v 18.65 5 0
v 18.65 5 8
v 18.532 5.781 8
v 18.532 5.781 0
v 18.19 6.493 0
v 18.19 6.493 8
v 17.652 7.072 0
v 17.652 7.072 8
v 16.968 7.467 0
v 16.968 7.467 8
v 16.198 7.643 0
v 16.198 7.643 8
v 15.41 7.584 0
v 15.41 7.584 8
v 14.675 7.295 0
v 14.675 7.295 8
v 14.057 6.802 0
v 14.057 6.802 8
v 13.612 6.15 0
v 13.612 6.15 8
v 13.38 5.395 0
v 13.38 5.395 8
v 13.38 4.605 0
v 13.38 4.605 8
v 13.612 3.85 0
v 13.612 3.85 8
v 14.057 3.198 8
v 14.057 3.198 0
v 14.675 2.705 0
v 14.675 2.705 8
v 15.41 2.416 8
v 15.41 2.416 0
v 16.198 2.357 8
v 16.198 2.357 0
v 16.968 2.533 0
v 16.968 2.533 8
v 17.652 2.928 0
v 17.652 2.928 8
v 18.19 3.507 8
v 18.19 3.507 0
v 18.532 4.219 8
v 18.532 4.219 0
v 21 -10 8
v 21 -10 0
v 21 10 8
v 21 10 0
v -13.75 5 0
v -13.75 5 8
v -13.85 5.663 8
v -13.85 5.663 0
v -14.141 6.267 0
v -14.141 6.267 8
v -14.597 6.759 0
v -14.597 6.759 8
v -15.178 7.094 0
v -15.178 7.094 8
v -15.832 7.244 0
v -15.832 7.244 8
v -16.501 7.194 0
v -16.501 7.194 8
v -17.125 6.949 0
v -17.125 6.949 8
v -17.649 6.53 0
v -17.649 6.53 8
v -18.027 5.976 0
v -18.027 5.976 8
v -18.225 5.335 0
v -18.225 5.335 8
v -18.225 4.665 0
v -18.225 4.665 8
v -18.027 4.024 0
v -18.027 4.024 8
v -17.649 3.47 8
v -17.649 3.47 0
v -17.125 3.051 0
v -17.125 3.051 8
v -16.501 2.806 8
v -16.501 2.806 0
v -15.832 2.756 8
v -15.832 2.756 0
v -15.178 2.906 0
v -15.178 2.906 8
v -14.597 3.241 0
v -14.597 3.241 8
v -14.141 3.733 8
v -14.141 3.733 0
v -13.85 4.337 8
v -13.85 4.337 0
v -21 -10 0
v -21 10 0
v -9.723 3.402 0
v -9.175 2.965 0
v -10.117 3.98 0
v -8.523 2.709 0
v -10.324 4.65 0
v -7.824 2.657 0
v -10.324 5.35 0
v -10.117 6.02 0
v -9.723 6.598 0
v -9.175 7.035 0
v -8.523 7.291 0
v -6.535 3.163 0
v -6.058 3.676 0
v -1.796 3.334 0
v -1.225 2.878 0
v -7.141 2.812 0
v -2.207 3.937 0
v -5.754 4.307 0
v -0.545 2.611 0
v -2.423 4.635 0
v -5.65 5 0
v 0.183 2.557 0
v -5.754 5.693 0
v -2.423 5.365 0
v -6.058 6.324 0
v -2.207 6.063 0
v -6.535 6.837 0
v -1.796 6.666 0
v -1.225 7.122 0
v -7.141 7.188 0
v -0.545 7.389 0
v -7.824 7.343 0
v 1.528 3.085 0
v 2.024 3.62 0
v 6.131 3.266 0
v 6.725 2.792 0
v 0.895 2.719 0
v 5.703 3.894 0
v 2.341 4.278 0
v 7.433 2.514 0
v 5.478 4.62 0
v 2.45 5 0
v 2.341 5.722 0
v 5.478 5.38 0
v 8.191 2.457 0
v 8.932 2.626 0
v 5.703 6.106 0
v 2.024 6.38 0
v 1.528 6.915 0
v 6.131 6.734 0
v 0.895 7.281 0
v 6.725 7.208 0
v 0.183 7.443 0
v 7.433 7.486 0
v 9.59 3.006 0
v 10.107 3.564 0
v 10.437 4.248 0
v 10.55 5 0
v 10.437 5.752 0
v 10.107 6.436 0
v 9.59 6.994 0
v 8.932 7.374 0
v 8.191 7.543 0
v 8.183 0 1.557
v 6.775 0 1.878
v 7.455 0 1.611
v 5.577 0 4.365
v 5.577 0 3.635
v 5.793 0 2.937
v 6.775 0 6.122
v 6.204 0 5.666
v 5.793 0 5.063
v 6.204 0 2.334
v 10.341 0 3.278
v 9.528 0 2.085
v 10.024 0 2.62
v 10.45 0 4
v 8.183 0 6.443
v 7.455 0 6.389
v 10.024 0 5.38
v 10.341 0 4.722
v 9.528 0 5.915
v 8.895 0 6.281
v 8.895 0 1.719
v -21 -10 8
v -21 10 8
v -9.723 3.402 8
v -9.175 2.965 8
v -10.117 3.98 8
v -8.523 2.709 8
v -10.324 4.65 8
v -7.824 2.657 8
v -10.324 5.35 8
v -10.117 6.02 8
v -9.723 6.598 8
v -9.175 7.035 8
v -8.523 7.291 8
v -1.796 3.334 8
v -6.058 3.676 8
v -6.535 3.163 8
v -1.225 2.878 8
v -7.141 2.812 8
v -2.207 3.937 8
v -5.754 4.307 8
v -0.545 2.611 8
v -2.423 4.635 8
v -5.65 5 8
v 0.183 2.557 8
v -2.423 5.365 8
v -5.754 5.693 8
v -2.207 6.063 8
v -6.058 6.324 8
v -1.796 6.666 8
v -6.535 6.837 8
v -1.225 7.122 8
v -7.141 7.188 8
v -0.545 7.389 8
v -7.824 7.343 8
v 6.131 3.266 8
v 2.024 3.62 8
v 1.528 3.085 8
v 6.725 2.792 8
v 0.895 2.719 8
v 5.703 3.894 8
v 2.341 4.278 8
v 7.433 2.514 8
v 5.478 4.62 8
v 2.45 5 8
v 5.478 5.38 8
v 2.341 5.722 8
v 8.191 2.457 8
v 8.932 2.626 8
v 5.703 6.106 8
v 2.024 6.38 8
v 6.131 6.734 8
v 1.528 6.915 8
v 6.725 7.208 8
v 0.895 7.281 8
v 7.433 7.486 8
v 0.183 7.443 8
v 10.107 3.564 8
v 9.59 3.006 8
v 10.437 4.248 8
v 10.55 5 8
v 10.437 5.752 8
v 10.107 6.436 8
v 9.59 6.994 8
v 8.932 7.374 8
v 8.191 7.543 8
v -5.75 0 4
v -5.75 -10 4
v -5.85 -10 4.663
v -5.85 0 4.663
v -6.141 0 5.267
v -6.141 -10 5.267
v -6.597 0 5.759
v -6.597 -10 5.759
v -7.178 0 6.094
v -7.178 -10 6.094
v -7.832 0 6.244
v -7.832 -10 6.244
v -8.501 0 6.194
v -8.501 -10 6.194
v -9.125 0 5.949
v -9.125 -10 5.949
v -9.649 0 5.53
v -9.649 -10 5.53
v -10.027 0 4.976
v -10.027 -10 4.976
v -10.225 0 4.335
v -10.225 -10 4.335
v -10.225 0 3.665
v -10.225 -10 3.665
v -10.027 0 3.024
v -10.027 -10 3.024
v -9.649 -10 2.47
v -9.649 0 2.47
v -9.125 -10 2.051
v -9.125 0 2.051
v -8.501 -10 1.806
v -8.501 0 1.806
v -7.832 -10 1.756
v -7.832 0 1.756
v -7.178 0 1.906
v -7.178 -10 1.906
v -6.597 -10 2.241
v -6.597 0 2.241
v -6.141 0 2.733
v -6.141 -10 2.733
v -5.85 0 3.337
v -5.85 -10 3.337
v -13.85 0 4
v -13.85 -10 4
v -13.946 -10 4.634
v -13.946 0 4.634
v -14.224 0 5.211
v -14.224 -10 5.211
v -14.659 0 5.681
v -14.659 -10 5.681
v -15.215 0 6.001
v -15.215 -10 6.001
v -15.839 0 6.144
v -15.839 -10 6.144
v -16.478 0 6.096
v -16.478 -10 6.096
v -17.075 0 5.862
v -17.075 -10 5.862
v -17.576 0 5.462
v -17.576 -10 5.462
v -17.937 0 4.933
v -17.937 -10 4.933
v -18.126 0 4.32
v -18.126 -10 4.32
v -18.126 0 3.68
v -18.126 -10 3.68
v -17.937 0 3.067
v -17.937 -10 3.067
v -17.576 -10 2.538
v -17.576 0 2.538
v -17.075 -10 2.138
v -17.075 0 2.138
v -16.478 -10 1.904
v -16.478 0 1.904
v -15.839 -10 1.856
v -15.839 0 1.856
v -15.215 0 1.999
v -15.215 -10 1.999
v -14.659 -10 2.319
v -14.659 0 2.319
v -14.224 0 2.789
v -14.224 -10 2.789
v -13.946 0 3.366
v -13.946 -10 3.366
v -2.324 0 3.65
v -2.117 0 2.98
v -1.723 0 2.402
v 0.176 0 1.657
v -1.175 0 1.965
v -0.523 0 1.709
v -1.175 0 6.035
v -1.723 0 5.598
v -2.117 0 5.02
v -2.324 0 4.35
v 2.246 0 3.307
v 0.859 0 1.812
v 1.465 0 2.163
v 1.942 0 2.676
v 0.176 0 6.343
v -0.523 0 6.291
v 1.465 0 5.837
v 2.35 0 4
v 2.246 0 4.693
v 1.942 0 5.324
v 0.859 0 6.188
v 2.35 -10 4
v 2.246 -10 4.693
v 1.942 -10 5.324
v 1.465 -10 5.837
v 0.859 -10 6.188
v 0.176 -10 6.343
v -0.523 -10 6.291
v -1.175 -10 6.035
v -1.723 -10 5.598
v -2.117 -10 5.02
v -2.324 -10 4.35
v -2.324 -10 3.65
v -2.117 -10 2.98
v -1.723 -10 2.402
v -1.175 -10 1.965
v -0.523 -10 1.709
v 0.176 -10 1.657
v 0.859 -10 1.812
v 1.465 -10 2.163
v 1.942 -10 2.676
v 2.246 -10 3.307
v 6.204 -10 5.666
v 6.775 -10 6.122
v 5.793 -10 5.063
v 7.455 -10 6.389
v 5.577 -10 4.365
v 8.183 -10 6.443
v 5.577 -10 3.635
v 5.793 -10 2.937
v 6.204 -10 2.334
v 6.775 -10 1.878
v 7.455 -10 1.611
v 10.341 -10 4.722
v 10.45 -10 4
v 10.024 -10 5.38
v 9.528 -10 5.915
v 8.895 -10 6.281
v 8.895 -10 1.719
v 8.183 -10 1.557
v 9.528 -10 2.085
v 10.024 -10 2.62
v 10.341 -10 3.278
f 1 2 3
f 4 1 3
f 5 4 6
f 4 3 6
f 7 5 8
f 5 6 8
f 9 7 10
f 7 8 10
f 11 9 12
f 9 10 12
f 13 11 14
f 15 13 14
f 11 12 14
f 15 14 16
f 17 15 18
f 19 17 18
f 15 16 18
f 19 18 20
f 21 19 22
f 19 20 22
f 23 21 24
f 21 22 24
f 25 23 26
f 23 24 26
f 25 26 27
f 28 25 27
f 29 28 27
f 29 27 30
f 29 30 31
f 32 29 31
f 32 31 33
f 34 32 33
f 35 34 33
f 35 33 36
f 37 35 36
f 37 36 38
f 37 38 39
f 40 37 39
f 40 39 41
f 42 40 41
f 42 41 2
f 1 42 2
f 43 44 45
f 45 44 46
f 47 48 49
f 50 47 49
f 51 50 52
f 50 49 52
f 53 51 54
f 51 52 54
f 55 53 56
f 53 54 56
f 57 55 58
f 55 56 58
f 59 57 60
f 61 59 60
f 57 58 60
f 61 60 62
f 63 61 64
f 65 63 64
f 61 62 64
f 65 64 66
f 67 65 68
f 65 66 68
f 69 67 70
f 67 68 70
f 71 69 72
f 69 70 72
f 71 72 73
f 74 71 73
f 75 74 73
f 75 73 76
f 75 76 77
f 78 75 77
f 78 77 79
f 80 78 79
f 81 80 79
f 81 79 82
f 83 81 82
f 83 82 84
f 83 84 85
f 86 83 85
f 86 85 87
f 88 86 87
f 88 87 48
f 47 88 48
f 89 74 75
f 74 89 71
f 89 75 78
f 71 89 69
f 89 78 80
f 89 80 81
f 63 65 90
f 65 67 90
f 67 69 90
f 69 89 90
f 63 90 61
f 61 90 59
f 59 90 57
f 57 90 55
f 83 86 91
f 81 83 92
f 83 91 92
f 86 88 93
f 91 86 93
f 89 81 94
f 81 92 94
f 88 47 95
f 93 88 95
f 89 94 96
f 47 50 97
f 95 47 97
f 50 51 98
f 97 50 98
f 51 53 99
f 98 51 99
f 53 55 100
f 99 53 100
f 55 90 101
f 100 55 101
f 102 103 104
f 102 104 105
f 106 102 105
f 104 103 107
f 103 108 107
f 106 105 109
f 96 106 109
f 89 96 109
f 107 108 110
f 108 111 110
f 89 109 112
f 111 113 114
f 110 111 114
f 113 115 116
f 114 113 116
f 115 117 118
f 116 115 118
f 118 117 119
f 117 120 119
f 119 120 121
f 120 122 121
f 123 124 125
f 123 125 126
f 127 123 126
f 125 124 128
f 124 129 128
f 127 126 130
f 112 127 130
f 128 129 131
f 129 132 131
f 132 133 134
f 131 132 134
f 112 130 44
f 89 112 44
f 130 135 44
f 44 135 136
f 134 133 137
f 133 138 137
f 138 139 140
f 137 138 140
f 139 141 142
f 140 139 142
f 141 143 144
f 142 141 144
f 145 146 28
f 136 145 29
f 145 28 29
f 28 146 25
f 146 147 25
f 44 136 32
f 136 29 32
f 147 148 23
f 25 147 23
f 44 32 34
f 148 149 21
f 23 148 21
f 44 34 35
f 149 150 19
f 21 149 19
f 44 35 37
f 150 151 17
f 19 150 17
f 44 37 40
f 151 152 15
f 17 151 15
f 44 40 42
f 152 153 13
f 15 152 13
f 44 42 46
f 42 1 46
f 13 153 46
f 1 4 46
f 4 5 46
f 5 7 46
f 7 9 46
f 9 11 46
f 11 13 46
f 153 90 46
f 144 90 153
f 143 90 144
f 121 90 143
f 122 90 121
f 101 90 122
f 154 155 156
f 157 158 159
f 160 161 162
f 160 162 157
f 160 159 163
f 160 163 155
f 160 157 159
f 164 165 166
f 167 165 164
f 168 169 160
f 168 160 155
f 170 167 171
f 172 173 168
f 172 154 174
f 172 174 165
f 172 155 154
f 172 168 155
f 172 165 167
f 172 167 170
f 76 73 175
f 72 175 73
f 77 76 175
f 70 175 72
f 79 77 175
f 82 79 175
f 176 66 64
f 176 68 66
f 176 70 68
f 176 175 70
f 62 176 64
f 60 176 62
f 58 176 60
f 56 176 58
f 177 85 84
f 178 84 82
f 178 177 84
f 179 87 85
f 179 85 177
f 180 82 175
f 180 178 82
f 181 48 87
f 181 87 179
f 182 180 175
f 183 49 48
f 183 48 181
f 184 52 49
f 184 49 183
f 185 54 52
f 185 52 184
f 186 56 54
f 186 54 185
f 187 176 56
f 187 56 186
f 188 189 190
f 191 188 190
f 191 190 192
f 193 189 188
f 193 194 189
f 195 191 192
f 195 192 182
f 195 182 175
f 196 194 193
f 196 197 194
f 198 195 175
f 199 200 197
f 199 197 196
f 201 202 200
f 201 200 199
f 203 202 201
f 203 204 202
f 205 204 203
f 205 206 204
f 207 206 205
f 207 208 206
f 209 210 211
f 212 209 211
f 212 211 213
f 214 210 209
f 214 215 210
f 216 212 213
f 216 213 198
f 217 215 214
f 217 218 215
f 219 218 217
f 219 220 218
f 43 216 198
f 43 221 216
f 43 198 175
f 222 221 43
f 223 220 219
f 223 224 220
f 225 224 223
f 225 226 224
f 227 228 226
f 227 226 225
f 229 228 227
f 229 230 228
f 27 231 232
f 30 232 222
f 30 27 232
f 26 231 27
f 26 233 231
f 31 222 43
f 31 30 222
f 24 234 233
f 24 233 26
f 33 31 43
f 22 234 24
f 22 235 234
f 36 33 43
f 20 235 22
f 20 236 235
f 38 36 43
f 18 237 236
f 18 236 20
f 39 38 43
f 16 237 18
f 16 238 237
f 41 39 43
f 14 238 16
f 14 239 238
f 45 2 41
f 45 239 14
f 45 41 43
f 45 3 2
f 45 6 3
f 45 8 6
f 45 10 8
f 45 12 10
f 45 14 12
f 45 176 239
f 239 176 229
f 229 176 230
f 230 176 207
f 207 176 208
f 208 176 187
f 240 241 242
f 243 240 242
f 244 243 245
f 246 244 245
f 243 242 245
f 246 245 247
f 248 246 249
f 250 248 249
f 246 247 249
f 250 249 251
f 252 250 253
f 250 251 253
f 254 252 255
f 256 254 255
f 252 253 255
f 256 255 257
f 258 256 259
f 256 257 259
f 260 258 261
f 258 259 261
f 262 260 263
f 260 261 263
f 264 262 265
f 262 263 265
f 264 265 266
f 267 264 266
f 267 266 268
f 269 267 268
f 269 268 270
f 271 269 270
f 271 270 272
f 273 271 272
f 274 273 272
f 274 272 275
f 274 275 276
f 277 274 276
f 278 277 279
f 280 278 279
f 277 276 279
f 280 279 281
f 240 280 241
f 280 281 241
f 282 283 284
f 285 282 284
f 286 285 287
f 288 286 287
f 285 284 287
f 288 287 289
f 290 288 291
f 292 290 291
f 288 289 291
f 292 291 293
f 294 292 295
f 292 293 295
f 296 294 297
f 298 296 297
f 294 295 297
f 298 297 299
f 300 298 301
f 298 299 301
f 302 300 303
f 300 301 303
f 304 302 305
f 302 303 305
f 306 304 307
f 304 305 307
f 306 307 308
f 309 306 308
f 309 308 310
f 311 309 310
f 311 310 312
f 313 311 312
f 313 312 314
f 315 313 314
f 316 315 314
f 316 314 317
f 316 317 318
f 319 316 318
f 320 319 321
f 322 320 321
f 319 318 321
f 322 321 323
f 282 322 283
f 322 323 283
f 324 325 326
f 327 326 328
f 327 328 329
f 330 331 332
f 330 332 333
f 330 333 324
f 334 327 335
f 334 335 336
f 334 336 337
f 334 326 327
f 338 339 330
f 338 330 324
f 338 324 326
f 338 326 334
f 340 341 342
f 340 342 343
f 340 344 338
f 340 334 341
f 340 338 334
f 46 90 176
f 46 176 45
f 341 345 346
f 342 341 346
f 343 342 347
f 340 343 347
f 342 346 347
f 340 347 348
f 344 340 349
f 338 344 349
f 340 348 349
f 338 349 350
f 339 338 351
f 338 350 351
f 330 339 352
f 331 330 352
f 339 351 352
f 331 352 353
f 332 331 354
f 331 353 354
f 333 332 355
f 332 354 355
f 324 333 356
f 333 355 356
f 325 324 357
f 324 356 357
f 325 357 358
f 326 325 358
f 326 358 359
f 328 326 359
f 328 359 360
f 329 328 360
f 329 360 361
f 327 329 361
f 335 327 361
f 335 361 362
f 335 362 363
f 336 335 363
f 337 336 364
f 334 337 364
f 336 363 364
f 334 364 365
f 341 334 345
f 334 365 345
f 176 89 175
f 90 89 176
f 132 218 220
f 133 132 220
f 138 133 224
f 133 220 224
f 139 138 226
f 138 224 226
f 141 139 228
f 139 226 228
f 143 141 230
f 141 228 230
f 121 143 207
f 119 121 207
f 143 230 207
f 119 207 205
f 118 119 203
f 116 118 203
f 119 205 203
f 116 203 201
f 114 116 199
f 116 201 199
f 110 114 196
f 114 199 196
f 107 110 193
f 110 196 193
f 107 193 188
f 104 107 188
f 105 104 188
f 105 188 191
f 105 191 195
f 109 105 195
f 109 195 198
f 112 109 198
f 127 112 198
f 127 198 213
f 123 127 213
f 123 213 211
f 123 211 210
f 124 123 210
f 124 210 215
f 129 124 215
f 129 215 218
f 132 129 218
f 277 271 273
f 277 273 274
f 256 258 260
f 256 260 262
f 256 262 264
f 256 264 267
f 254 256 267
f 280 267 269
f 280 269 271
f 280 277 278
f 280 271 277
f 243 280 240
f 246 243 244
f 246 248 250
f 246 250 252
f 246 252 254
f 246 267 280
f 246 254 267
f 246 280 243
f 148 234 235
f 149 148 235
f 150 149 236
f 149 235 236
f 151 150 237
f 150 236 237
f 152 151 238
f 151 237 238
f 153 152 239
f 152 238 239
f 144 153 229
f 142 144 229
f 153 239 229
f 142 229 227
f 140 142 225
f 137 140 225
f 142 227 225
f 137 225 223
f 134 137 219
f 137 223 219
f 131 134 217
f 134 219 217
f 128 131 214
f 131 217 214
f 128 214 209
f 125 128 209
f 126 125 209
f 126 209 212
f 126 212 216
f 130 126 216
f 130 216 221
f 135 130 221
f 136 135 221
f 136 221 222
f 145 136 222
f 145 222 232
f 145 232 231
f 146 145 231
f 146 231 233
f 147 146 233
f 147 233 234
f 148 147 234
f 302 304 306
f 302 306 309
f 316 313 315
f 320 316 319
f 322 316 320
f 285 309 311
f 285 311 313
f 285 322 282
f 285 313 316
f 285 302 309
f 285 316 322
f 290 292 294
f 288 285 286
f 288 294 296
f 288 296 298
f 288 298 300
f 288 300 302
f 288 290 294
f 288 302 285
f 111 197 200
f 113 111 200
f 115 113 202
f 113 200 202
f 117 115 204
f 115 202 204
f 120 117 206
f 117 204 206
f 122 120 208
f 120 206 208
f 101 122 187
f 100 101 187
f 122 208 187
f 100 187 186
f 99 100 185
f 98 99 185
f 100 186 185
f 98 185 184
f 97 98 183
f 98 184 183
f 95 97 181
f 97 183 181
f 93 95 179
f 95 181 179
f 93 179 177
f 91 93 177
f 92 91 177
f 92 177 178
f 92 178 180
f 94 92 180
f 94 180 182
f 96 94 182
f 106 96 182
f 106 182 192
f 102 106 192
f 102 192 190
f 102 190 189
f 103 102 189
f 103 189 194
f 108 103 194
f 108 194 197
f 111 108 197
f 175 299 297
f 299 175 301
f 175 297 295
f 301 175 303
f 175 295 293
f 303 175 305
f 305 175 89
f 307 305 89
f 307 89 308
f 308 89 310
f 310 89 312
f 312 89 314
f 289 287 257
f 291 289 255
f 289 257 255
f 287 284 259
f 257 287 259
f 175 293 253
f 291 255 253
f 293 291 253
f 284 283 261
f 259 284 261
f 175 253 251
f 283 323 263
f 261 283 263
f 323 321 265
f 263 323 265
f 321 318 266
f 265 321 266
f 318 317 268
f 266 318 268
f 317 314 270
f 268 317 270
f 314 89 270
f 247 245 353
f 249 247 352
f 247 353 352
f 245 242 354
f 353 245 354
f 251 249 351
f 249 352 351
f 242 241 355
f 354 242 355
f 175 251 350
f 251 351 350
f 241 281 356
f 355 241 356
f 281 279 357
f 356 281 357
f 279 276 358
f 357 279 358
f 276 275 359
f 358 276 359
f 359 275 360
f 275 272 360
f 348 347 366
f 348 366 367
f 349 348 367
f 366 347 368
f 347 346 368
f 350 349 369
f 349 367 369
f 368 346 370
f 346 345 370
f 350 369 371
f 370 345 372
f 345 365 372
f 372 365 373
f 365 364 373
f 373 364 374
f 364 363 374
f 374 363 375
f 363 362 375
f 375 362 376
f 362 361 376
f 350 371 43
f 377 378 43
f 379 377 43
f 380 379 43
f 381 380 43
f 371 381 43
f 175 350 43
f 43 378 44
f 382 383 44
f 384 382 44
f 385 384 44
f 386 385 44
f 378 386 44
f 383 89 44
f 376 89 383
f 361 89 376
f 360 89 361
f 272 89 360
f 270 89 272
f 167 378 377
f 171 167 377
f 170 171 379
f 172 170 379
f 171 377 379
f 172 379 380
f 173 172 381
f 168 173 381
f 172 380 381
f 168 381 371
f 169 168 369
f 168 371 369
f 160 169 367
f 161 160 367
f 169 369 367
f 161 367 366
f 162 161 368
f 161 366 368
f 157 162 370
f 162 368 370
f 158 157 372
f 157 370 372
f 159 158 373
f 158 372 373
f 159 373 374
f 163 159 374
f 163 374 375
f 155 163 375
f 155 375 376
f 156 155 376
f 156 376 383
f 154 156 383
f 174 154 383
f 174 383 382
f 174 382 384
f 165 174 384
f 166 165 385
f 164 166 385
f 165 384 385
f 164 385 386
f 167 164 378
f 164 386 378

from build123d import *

# Parameters (mm, degrees)
SKETCH_1_W          = 42
SKETCH_1_H          = 20
EXTRUDE_1_DEPTH     = 8
SKETCH_2_R          = 2.25
SKETCH_2_R_2        = 2.35
SKETCH_2_R_3        = 2.45
SKETCH_2_R_4        = 2.55
SKETCH_2_R_5        = 2.65
CUT_EXTRUDE_1_DEPTH = 9
SKETCH_3_R          = 2.15
SKETCH_3_R_2        = 2.25
SKETCH_3_R_3        = 2.35
SKETCH_3_R_4        = 2.45
CUT_EXTRUDE_2_DEPTH = 10


with BuildPart() as part:
    # ｽｹｯﾁ1 → ﾎﾞｽ - 押し出し1 (new body)
    with BuildSketch(Plane.XY):
        Rectangle(SKETCH_1_W, SKETCH_1_H)
    extrude(amount=EXTRUDE_1_DEPTH)

    # ｽｹｯﾁ2 → ｶｯﾄ - 押し出し1 (cut, through all)
    with BuildSketch(Plane.XY.offset(8)):
        with Locations((-16, 5)):
            Circle(SKETCH_2_R)
        with Locations((-8, 5)):
            Circle(SKETCH_2_R_2)
        with Locations((0, 5)):
            Circle(SKETCH_2_R_3)
        with Locations((8, 5)):
            Circle(SKETCH_2_R_4)
        with Locations((16, 5)):
            Circle(SKETCH_2_R_5)
    extrude(amount=-CUT_EXTRUDE_1_DEPTH, mode=Mode.SUBTRACT)

    # ｽｹｯﾁ3 → ｶｯﾄ - 押し出し2 (cut)
    with BuildSketch(Plane.XZ.offset(10)):
        with Locations((-16, 4)):
            Circle(SKETCH_3_R)
        with Locations((-8, 4)):
            Circle(SKETCH_3_R_2)
        with Locations((0, 4)):
            Circle(SKETCH_3_R_3)
        with Locations((8, 4)):
            Circle(SKETCH_3_R_4)
    extrude(amount=-CUT_EXTRUDE_2_DEPTH, mode=Mode.SUBTRACT)


solid = part.part
